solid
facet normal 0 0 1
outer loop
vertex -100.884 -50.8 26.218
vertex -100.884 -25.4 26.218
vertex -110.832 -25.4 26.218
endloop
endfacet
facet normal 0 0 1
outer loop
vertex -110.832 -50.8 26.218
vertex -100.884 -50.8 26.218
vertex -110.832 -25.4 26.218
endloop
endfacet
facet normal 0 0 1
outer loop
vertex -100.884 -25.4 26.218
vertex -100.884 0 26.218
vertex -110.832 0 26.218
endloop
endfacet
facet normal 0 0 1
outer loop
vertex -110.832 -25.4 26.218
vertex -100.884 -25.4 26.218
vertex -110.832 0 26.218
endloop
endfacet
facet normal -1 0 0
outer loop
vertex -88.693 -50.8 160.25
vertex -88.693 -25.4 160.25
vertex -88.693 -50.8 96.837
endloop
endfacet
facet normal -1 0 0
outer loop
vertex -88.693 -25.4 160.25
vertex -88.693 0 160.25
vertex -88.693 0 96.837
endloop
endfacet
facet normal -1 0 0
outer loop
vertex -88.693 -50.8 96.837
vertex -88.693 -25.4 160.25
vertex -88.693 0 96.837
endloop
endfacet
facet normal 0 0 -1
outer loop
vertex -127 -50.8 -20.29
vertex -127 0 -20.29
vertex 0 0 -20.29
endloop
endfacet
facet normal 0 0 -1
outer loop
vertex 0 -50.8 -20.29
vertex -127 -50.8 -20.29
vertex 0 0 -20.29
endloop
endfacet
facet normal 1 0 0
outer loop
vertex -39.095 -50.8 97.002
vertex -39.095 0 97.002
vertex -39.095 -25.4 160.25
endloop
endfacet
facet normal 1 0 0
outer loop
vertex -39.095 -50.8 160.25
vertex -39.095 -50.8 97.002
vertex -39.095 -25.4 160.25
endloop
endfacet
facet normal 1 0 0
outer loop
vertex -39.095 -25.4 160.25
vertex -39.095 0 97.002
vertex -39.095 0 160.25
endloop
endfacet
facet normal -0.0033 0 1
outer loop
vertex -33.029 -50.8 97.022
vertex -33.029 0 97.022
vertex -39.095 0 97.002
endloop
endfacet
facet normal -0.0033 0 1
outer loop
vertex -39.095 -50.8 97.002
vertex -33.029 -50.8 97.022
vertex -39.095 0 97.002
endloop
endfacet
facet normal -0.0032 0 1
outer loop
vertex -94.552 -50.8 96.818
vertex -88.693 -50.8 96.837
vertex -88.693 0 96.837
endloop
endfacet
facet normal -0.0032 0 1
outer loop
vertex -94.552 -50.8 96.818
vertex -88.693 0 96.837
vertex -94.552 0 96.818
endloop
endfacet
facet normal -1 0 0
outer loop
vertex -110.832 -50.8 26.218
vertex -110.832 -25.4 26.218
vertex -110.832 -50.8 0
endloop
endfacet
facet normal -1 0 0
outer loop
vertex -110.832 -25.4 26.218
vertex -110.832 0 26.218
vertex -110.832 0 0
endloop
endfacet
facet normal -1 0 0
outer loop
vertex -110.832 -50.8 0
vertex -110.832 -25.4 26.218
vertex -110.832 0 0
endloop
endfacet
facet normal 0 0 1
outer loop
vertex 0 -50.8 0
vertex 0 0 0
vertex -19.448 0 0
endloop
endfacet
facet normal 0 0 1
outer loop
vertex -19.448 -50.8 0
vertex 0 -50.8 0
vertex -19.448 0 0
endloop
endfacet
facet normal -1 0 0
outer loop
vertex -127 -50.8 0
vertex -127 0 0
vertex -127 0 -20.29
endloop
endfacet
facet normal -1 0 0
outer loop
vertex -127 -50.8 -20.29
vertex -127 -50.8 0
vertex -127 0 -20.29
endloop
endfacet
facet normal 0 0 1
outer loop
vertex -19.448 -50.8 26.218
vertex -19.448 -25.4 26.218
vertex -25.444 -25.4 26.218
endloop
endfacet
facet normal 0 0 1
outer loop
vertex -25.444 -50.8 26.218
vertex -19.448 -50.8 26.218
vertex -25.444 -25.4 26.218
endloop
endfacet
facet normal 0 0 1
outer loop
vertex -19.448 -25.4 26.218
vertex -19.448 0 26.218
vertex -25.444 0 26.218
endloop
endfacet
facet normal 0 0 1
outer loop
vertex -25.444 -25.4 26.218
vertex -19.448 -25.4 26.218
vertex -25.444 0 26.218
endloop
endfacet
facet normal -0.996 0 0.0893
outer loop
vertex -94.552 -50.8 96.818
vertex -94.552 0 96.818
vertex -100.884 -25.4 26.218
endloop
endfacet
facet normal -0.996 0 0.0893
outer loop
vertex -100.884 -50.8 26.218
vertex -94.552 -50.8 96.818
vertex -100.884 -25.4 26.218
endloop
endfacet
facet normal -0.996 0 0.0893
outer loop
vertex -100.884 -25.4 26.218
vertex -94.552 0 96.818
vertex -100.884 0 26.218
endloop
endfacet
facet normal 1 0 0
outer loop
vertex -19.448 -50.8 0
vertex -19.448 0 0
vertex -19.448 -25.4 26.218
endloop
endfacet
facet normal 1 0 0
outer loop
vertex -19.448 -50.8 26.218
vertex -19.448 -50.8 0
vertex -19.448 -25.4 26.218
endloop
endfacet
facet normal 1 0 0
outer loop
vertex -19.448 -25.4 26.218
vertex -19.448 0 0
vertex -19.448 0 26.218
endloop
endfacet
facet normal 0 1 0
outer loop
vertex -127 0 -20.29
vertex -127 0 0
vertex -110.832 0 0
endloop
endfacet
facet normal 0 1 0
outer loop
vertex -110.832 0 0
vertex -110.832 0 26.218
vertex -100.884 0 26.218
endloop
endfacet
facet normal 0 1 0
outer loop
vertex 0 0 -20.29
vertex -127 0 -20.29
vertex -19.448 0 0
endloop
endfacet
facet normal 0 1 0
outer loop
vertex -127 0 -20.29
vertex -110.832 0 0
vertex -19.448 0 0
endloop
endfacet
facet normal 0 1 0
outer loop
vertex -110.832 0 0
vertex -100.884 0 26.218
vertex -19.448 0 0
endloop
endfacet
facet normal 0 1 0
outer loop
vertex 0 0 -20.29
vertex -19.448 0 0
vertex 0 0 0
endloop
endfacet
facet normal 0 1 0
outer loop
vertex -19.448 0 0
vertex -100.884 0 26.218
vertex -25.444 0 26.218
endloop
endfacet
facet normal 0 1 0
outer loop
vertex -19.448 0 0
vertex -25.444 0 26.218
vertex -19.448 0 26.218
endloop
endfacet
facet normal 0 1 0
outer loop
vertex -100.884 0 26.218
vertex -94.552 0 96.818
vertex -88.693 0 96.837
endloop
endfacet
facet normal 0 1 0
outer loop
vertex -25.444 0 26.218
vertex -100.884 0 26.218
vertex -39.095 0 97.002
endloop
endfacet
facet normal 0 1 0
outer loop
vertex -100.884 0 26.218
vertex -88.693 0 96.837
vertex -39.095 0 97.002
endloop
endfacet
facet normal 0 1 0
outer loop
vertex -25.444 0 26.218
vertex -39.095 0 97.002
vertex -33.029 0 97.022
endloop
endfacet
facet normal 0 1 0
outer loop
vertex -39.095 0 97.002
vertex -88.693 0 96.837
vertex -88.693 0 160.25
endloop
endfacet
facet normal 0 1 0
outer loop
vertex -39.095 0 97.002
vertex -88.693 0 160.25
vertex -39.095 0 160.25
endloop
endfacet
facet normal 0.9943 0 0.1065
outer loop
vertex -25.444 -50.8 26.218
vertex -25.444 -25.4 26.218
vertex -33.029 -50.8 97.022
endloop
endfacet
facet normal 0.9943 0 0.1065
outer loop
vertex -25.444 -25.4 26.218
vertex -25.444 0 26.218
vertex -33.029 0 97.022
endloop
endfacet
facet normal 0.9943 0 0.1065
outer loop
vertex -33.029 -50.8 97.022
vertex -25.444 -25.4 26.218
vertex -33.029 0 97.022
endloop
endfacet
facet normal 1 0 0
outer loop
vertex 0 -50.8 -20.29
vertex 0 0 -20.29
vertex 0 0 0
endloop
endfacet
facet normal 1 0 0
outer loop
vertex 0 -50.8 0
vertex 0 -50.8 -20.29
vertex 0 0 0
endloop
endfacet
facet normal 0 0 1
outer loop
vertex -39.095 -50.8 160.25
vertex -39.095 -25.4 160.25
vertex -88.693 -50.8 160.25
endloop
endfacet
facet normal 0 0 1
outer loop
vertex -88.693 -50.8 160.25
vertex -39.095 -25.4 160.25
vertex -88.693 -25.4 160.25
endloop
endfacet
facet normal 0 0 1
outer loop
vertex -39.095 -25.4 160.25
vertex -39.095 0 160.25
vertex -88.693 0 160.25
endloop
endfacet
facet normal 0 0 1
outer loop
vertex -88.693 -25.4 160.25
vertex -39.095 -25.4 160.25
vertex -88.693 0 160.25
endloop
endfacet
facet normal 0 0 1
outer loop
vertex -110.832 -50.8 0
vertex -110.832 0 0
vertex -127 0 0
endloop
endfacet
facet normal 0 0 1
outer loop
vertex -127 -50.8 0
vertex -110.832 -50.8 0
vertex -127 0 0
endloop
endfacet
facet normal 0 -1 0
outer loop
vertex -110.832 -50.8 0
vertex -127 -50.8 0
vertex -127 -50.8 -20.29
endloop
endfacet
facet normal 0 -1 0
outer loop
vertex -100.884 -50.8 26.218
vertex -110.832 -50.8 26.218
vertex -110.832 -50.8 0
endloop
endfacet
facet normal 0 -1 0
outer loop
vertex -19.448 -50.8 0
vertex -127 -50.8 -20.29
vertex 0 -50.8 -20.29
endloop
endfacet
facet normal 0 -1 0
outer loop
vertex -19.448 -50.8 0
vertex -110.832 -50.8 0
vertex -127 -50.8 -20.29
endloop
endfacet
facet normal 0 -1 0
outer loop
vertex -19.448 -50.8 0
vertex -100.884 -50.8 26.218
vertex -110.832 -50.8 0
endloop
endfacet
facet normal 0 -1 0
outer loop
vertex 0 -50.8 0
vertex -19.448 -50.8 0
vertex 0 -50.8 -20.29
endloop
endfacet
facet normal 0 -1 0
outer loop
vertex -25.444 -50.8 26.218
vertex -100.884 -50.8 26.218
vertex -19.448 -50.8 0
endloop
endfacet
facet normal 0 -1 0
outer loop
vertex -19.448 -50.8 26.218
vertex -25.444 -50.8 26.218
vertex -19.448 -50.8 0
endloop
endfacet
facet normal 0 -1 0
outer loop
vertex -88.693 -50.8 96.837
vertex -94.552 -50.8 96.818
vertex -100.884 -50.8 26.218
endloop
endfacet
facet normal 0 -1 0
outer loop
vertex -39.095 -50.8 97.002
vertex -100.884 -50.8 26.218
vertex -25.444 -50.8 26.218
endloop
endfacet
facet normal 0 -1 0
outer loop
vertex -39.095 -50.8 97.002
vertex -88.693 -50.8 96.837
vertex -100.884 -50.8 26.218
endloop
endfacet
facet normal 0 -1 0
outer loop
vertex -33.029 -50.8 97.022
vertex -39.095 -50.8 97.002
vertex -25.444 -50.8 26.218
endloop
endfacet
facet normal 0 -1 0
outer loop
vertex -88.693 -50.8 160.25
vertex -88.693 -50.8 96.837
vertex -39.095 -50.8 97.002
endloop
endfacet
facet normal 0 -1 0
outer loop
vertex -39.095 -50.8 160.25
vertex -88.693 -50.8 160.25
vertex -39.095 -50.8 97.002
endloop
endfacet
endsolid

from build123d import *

# Parameters (mm, degrees)
F1_DEPTH = 25.4
F4_DEPTH = 25.4
F5_DEPTH = 25.4


# Not quite as in the source:
# - the program builds the solid bodies; features that only make, move or delete a surface that nothing else refers to are left out


with BuildPart() as f1:
    # F0 (on Front) → F1 (new body)
    with BuildSketch(Plane.XZ):
        Polygon((0, -20.290305838), (0, 0), (-19.4481890649, 0), (-110.8317822218, 0), (-127, 0), (-127, -20.290305838), align=None)
        Polygon((-110.8317822218, 0), (-19.4481890649, 0), (-19.4481890649, 26.2184105814), (-25.4435241222, 26.2184105814), (-100.8837223053, 26.2184105814), (-110.8317822218, 26.2184105814), align=None)
        Polygon((-100.8837223053, 26.2184105814), (-25.4435241222, 26.2184105814), (-33.0289951575, 97.0223118013), (-39.0950739384, 97.0021236187), (-39.0950739384, 96.837057952), (-88.6934632531, 96.837057952), (-94.5519953966, 96.8175604939), align=None)
    extrude(amount=F1_DEPTH)

    # F0 (on Front) → F4 (join)
    with BuildSketch(Plane.XZ):
        Polygon((0, -20.290305838), (0, 0), (-19.4481890649, 0), (-110.8317822218, 0), (-127, 0), (-127, -20.290305838), align=None)
        Polygon((-110.8317822218, 0), (-19.4481890649, 0), (-19.4481890649, 26.2184105814), (-25.4435241222, 26.2184105814), (-100.8837223053, 26.2184105814), (-110.8317822218, 26.2184105814), align=None)
        Polygon((-100.8837223053, 26.2184105814), (-25.4435241222, 26.2184105814), (-33.0289951575, 97.0223118013), (-39.0950739384, 97.0021236187), (-39.0950739384, 96.837057952), (-88.6934632531, 96.837057952), (-94.5519953966, 96.8175604939), align=None)
        Polygon((-39.0950739384, 96.837057952), (-39.0950739384, 97.0021236187), (-88.6934632531, 96.837057952), align=None)
        Polygon((-88.6934632531, 96.837057952), (-39.0950739384, 97.0021236187), (-39.0950739384, 160.250261426), (-88.6934632531, 160.250261426), align=None)
    extrude(amount=F4_DEPTH)

    # F0 (on Front) + F4_face (on face) → F5 (join)
    with BuildSketch(Plane.XZ):
        Polygon((0, -20.290305838), (0, 0), (-19.4481890649, 0), (-110.8317822218, 0), (-127, 0), (-127, -20.290305838), align=None)
        Polygon((-110.8317822218, 0), (-19.4481890649, 0), (-19.4481890649, 26.2184105814), (-25.4435241222, 26.2184105814), (-100.8837223053, 26.2184105814), (-110.8317822218, 26.2184105814), align=None)
        Polygon((-100.8837223053, 26.2184105814), (-25.4435241222, 26.2184105814), (-33.0289951575, 97.0223118013), (-39.0950739384, 97.0021236187), (-39.0950739384, 96.837057952), (-88.6934632531, 96.837057952), (-94.5519953966, 96.8175604939), align=None)
        Polygon((-39.0950739384, 96.837057952), (-39.0950739384, 97.0021236187), (-88.6934632531, 96.837057952), align=None)
        Polygon((-88.6934632531, 96.837057952), (-39.0950739384, 97.0021236187), (-39.0950739384, 160.250261426), (-88.6934632531, 160.250261426), align=None)
    with BuildSketch(Plane(origin=(-63.8821440169, -25.4, 54.1439890392), x_dir=(1, 0, 0), z_dir=(0, -1, 0))):
        Polygon((63.8821440169, -74.4342948772), (63.8821440169, -54.1439890392), (44.433954952, -54.1439890392), (44.433954952, -27.9255784579), (38.4386198947, -27.9255784579), (30.8531488594, 42.8783227621), (24.7870700785, 42.8581345795), (24.7870700785, 106.1062723867), (-24.8113192362, 106.1062723867), (-24.8113192362, 42.6930689128), (-30.6698513797, 42.6735714547), (-37.0015782884, -27.9255784579), (-46.9496382049, -27.9255784579), (-46.9496382049, -54.1439890392), (-63.1178559831, -54.1439890392), (-63.1178559831, -74.4342948772), align=None)
    extrude(amount=F5_DEPTH)


solid = f1.part
